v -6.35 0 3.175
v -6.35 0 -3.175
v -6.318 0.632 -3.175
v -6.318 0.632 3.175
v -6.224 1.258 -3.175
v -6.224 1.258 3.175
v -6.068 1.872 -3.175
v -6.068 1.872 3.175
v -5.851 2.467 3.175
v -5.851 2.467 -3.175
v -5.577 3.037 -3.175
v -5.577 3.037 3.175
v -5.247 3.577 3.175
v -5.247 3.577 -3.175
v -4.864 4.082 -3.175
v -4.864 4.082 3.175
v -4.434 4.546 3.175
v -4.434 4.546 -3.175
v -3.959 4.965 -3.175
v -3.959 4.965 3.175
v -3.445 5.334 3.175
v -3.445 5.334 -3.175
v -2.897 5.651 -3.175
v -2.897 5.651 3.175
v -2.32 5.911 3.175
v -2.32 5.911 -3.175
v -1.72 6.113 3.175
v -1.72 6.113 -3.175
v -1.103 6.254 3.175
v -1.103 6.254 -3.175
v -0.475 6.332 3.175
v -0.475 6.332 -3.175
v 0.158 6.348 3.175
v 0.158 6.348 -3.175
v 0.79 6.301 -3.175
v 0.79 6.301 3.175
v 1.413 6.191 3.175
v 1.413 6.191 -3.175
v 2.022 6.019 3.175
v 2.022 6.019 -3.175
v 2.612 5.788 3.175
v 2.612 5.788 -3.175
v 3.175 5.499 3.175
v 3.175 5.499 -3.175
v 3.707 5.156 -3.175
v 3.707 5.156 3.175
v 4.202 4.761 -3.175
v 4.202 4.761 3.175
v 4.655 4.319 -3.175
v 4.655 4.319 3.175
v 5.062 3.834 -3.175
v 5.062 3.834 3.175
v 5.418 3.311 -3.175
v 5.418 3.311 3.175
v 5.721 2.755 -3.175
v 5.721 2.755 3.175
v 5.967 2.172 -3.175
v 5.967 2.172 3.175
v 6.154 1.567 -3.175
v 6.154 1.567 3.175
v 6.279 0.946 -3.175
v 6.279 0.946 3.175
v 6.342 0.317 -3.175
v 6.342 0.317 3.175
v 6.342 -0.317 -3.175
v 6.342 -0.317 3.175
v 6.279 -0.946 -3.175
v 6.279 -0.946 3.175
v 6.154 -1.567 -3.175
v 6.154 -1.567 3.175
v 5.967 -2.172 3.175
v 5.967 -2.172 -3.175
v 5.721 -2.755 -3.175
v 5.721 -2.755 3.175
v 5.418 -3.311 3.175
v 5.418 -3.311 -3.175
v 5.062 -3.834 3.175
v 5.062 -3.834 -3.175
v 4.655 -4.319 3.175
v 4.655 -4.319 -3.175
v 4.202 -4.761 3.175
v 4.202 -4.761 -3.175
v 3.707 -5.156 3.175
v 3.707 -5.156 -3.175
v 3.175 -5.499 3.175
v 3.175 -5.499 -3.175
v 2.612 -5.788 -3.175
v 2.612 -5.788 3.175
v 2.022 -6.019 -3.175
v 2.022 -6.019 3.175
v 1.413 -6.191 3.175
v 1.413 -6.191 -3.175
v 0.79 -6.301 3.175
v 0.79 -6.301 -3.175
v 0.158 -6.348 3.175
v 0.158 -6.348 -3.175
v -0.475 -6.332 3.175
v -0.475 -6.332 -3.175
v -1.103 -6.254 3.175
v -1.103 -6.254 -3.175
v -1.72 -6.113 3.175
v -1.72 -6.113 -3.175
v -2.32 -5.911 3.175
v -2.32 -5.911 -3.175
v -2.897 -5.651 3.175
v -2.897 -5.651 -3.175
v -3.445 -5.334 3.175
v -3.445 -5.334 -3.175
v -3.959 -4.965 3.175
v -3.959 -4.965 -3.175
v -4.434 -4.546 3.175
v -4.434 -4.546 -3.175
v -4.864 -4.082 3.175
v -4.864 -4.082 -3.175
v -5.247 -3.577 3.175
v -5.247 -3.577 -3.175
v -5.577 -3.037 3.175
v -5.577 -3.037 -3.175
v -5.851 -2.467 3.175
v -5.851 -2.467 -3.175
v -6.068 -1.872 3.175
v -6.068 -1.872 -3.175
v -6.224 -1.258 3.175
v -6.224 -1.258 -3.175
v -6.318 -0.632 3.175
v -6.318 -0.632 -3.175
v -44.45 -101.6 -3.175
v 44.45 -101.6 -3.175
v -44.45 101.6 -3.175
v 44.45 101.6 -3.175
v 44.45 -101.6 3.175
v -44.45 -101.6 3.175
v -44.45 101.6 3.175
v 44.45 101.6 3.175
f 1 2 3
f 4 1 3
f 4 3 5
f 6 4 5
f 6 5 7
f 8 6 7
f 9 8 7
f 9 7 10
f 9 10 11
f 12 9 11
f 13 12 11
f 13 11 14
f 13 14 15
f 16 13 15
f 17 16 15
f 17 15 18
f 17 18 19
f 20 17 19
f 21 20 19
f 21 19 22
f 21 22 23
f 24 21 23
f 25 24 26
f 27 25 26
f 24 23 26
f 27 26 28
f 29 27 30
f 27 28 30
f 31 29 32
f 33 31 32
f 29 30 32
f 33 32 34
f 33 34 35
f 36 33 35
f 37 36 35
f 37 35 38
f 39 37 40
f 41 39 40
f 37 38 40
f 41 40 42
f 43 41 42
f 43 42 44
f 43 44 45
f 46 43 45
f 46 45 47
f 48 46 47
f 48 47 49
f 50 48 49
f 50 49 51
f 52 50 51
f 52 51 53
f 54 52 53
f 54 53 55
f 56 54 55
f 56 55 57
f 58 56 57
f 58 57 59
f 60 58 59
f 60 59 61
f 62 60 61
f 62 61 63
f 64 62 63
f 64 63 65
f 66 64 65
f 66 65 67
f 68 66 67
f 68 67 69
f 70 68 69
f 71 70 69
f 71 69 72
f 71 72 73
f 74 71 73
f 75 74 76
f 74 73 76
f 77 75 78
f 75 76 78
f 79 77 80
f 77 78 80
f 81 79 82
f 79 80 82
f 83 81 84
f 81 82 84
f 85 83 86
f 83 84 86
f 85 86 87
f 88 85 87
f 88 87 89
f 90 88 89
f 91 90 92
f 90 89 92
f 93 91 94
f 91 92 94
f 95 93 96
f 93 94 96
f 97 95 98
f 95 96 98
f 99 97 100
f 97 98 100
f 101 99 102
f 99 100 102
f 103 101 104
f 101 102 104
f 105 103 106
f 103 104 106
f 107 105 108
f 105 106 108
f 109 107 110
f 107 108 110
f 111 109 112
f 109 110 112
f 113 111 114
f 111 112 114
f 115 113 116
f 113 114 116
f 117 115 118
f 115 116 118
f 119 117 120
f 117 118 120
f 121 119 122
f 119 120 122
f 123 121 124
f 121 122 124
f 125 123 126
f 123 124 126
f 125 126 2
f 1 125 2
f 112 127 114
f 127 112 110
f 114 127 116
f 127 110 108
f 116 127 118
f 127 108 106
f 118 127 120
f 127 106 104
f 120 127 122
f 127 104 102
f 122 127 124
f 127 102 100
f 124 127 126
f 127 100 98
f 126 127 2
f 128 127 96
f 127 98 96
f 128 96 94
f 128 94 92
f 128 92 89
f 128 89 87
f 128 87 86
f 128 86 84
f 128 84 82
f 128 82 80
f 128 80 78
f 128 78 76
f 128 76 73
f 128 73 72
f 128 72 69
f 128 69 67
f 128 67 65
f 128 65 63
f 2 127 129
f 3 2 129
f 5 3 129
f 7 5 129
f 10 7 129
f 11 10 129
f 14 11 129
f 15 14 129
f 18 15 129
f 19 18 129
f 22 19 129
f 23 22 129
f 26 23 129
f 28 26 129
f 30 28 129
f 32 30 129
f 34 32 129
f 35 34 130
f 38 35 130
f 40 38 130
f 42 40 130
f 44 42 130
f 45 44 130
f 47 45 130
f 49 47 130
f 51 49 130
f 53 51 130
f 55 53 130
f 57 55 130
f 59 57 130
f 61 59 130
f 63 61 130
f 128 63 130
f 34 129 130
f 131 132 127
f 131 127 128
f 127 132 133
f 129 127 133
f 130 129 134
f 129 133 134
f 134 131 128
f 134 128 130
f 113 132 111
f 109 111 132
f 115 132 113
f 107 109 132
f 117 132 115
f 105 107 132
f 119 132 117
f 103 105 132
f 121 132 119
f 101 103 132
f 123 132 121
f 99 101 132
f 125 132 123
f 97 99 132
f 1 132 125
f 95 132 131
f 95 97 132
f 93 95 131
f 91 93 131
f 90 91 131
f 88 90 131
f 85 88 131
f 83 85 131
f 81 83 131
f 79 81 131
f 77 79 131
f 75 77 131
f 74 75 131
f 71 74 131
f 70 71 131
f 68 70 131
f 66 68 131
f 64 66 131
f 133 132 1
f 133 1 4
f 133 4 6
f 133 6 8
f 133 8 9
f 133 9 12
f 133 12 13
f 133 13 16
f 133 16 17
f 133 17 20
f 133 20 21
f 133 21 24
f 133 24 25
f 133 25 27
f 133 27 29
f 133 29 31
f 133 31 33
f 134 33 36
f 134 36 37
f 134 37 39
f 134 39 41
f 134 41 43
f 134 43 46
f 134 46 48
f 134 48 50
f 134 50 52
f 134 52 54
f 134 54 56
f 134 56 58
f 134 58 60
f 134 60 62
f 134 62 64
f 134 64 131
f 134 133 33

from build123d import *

# Parameters (mm, degrees)
SKETCH1_W                  = 88.9
SKETCH1_H                  = 203.2
BOSS_EXTRUDE1_DEPTH        = 3.175
F_1_2_0_5_DIAMETER_HOLE1_D = 12.7


with BuildPart() as part:
    # Sketch1 → Boss-Extrude1 (new, symmetric)
    with BuildSketch(Plane.XY):
        Rectangle(SKETCH1_W, SKETCH1_H)
    extrude(amount=BOSS_EXTRUDE1_DEPTH, both=True)

    # 1/2 (0.5) Diameter Hole1 (through all)
    with Locations(Plane.XY.offset(3.175)):
        with Locations((0, 0)):
            Hole(F_1_2_0_5_DIAMETER_HOLE1_D / 2)


solid = part.part
